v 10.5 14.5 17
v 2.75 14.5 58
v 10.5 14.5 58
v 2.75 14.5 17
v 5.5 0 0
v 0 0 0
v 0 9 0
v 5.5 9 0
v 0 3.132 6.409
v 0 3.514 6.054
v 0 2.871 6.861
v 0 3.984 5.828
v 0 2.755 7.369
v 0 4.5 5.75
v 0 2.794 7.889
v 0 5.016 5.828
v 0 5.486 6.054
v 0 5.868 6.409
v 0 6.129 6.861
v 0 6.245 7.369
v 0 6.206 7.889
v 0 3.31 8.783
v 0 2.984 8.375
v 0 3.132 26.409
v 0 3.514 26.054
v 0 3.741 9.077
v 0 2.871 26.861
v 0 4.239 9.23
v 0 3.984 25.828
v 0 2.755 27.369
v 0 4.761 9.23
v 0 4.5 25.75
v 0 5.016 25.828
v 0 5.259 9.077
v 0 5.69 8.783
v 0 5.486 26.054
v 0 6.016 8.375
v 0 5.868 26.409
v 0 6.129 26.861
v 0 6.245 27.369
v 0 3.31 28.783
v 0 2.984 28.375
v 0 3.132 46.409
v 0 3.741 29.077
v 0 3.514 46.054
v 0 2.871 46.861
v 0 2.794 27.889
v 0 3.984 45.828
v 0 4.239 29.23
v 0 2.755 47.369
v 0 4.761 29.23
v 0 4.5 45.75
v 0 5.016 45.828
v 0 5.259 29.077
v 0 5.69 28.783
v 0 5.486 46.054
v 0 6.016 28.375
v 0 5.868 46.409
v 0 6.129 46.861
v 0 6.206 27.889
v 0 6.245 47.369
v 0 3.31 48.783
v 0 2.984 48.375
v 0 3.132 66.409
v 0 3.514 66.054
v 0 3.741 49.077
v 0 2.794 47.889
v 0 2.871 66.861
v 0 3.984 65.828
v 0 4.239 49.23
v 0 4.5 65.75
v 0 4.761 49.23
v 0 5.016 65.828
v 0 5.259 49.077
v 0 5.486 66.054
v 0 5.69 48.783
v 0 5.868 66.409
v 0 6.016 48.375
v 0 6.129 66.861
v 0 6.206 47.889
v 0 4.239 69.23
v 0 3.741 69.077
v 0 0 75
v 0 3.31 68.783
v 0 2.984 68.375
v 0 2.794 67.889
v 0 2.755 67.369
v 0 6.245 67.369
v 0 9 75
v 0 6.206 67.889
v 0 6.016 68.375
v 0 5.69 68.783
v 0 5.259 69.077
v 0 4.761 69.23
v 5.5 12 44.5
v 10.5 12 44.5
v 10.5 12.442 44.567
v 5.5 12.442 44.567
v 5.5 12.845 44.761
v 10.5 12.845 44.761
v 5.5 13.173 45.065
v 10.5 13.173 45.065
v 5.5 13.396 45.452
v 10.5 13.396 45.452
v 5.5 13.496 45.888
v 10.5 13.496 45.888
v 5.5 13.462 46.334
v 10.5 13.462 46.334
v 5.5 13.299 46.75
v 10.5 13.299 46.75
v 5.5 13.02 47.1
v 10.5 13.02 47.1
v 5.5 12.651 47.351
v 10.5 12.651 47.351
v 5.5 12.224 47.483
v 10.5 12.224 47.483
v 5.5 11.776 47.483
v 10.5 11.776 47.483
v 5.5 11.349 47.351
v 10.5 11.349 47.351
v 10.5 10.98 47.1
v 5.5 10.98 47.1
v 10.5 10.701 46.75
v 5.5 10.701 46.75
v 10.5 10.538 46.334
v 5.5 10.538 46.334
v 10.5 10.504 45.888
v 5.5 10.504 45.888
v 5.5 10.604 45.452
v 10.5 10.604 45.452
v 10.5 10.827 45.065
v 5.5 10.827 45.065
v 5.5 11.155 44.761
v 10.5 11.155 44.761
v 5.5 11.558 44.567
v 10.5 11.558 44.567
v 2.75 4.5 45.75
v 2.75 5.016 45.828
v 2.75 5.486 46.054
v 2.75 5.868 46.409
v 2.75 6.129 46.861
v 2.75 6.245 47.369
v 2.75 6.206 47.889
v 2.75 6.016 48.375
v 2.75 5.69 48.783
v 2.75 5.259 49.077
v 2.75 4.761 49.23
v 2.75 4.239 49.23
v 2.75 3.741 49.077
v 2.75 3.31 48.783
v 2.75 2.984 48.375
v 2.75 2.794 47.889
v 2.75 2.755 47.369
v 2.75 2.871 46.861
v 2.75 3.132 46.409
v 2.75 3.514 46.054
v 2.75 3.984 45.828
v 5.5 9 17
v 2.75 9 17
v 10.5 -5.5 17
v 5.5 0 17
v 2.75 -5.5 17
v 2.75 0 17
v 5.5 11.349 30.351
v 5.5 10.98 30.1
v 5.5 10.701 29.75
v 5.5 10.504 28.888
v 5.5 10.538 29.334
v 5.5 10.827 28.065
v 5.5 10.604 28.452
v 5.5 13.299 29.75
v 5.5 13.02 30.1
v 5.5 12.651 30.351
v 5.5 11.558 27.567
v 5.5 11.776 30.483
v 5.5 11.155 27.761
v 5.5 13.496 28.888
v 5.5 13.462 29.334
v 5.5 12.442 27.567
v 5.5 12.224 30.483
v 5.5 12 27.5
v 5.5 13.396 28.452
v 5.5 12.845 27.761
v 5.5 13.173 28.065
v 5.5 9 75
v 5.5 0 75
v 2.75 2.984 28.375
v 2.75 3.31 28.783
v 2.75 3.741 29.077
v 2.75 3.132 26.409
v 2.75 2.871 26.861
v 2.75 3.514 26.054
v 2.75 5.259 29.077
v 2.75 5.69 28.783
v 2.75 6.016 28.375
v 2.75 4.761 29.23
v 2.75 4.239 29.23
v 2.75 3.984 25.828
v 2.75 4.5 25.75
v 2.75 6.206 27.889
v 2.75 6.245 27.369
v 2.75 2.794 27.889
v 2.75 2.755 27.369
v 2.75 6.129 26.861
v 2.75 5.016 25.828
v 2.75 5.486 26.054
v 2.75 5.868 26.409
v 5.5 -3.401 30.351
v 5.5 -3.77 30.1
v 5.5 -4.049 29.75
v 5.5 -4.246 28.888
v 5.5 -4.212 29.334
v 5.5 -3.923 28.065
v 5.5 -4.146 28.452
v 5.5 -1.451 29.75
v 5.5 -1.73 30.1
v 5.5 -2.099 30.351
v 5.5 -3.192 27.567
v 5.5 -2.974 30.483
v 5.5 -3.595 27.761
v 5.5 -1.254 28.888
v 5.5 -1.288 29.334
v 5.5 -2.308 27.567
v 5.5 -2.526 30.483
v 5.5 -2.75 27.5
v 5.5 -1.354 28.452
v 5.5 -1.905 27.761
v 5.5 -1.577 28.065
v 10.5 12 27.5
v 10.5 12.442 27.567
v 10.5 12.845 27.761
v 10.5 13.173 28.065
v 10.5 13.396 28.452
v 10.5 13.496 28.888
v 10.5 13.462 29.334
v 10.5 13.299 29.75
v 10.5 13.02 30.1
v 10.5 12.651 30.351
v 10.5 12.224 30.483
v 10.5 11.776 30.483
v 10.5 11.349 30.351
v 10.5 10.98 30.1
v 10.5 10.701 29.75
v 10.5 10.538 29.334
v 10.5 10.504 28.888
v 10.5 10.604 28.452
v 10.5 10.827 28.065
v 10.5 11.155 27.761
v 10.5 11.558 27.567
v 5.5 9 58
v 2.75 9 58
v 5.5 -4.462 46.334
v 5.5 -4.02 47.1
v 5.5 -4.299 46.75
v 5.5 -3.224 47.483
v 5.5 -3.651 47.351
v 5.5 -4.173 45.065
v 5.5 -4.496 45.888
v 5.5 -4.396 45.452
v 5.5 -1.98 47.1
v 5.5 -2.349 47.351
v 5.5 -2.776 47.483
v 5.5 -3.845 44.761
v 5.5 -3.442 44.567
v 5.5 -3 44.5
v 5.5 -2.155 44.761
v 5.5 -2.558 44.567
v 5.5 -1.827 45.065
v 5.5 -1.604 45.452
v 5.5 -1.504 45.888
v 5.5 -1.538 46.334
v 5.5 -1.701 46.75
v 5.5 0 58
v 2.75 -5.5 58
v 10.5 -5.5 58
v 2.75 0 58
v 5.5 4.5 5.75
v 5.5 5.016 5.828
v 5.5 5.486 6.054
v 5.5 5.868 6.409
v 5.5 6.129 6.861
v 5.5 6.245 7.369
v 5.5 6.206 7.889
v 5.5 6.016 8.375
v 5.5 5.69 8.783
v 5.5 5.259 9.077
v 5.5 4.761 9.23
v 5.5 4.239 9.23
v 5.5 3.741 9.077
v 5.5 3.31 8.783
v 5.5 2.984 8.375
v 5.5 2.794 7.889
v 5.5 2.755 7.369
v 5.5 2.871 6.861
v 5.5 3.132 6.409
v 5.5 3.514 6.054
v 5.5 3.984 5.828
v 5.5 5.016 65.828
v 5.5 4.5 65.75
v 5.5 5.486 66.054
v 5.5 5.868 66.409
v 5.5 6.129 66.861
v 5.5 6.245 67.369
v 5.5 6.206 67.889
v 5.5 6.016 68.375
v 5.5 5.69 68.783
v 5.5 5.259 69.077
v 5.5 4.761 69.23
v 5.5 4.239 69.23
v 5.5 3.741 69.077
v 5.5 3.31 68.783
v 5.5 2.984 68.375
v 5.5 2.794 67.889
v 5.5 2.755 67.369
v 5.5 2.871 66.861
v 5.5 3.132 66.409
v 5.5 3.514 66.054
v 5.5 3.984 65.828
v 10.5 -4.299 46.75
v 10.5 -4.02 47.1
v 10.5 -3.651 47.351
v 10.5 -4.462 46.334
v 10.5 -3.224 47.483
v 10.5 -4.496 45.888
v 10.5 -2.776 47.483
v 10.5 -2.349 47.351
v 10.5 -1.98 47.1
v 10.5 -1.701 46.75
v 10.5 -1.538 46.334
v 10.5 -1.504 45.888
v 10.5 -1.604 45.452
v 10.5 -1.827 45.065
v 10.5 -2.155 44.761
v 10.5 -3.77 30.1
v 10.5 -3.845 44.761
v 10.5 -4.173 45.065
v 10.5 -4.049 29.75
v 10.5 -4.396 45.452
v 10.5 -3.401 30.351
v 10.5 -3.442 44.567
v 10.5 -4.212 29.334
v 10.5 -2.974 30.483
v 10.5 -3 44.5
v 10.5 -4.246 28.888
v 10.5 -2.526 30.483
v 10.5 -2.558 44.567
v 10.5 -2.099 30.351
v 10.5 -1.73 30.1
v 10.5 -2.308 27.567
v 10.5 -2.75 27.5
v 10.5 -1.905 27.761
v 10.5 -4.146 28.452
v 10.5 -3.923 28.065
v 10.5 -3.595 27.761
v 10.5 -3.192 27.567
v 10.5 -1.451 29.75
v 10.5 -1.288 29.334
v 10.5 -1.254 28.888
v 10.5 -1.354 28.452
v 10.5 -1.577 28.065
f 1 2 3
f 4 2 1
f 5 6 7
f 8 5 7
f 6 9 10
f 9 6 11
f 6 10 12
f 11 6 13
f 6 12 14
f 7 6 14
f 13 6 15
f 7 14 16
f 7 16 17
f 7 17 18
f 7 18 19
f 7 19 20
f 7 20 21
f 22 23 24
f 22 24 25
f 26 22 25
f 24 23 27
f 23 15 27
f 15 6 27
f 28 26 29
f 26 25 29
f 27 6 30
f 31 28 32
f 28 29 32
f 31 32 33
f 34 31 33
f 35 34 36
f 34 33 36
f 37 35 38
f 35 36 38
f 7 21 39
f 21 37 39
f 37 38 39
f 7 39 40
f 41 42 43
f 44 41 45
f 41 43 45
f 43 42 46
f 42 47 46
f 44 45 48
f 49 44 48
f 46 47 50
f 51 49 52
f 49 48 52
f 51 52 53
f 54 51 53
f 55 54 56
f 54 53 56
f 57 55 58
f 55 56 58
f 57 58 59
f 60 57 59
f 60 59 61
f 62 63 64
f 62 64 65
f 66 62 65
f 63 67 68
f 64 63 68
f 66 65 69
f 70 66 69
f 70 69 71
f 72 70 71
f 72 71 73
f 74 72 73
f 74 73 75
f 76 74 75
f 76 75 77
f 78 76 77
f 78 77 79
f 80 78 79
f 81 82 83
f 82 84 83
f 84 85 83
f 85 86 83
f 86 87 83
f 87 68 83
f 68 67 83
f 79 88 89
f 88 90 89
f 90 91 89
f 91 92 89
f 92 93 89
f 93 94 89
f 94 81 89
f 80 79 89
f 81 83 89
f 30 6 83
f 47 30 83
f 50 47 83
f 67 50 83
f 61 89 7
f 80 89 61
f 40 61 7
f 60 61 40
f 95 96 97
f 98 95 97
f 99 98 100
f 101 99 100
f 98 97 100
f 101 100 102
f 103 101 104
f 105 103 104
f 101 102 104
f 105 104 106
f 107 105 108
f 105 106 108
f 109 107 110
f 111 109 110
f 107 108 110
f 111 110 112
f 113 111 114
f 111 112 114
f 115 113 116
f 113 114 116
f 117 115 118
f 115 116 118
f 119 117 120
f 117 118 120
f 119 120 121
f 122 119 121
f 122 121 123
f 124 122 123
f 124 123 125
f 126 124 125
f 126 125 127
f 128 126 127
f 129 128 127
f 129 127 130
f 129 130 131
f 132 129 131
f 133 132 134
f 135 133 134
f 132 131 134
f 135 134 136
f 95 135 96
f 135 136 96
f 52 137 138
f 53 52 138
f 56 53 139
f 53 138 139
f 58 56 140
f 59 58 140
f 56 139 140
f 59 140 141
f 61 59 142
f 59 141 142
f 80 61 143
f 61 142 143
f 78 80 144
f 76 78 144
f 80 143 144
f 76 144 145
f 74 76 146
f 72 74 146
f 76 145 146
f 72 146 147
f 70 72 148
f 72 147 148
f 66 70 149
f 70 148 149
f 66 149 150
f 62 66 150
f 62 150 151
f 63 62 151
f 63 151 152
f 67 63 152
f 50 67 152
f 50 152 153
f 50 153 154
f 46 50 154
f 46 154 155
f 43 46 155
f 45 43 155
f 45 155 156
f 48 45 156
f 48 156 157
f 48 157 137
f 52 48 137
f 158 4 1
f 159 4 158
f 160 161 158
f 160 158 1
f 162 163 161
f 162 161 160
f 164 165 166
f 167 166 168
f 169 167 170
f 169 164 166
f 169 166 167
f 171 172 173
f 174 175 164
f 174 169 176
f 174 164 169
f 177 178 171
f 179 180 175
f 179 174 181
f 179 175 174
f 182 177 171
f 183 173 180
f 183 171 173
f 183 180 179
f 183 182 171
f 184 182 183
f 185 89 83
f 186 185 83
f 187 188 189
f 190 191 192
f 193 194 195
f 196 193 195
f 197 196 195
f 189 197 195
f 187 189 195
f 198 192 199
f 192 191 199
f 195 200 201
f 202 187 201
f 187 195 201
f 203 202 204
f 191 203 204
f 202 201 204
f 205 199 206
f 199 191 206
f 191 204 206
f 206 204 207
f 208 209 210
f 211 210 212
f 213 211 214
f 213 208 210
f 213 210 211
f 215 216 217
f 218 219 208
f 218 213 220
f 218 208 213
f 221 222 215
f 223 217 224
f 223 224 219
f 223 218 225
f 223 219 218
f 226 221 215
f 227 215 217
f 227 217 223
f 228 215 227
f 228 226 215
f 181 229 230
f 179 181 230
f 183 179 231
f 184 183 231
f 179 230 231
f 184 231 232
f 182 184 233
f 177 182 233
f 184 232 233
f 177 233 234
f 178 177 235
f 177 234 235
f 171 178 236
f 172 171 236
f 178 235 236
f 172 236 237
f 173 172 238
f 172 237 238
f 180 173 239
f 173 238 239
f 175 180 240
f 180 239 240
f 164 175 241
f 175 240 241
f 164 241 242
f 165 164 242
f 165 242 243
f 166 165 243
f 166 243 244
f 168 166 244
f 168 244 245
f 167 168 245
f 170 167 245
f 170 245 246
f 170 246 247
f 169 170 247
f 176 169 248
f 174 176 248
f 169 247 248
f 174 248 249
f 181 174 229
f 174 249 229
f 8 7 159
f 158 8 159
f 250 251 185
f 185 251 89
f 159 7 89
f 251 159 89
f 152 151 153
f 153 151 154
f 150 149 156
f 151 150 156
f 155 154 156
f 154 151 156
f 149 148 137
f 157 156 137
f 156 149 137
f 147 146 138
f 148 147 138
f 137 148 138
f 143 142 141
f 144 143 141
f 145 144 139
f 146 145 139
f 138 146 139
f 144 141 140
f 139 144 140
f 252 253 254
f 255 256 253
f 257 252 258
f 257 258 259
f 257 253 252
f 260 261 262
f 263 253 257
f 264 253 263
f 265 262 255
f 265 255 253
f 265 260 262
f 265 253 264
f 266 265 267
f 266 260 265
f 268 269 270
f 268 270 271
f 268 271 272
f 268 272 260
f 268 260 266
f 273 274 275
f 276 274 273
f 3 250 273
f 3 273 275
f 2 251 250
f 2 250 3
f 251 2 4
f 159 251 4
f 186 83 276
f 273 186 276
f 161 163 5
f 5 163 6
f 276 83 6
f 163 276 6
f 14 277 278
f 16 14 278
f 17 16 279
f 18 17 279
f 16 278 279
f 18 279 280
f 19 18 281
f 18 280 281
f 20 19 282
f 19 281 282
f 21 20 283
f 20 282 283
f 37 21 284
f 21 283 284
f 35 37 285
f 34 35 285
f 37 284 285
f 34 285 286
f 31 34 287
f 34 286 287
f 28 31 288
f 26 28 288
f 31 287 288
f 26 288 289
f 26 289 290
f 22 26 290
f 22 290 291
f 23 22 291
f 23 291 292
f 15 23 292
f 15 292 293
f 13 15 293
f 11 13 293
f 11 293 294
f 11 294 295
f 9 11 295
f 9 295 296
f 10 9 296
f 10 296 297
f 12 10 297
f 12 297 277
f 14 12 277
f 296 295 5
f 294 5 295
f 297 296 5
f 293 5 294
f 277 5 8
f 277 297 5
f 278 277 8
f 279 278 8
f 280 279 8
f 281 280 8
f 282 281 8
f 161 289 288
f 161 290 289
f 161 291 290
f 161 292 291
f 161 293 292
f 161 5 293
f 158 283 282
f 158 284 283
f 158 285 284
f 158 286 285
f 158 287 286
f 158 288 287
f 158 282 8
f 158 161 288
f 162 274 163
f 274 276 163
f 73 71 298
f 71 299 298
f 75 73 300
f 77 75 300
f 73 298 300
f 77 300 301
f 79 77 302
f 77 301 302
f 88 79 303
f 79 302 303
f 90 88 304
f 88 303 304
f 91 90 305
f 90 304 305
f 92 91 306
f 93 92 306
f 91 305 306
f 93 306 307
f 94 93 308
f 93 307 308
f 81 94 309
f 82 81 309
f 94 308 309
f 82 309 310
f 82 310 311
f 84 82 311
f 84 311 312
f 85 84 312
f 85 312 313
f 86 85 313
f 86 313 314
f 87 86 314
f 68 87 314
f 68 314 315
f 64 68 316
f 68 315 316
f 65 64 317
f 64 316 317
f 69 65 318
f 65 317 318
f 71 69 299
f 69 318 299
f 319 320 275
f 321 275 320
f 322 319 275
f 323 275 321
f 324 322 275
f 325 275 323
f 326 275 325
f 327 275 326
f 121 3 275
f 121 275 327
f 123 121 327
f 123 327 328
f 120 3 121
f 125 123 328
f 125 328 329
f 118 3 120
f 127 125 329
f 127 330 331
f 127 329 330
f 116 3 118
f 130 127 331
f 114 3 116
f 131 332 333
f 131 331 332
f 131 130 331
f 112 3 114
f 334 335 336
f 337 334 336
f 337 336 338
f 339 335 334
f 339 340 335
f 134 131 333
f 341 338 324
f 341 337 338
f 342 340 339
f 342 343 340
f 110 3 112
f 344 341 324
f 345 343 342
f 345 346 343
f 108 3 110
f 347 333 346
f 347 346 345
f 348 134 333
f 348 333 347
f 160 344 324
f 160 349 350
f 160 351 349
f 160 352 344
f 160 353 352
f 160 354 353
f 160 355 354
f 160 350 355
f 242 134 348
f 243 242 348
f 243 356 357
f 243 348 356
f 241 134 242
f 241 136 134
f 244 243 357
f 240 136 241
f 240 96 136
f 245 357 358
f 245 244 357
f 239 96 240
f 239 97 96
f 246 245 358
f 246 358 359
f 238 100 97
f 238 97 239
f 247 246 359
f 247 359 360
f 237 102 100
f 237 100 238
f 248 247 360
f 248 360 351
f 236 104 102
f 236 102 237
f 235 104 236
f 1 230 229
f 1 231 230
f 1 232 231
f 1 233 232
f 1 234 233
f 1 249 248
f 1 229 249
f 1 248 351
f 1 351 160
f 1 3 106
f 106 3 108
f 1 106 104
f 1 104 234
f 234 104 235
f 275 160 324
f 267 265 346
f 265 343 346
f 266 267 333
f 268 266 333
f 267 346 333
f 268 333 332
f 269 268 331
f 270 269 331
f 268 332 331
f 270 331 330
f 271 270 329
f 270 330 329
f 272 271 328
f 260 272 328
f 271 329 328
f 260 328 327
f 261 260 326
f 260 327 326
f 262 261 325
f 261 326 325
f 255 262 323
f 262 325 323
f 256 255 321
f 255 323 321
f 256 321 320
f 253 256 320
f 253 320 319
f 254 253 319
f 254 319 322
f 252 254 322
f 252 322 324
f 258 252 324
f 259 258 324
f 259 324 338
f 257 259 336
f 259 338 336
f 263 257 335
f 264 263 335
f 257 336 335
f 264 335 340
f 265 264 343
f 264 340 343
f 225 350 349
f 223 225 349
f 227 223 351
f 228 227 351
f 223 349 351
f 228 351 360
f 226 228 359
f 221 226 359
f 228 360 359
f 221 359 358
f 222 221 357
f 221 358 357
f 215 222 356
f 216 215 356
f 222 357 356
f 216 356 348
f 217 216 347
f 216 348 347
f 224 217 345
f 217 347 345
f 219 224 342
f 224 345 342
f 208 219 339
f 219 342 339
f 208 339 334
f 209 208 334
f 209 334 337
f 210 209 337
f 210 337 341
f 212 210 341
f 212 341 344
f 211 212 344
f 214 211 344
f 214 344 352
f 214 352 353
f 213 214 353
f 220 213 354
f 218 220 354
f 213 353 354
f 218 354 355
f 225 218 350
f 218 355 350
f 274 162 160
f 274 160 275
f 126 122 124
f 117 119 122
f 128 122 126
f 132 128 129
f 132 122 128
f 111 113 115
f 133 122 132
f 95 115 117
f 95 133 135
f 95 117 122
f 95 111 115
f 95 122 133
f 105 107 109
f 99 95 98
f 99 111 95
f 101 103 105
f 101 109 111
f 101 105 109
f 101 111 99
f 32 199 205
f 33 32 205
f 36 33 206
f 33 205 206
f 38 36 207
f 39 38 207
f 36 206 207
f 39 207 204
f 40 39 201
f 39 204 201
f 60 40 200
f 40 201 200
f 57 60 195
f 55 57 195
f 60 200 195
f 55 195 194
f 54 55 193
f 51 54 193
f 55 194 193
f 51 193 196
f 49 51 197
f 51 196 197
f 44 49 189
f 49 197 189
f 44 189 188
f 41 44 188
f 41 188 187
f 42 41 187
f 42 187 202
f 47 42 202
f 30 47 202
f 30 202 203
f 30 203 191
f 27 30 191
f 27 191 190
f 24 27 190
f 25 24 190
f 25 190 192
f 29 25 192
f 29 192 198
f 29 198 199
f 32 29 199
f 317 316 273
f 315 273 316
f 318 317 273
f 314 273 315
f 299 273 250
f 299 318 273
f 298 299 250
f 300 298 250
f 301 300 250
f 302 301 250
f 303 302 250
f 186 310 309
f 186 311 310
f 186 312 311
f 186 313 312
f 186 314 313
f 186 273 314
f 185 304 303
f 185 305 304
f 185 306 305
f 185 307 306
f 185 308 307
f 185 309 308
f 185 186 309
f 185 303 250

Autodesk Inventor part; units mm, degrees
ref_plane "YZ Plane" through (0, 0, 0) normal (1, 0, 0) x (0, 1, 0)
ref_plane "XZ Plane" through (0, 0, 0) normal (0, 1, 0) x (-1, 0, 0)
ref_plane "XY Plane" through (0, 0, 0) normal (0, 0, 1) x (1, 0, 0)
sketch "Skizze1" plane through (0, 0, 0) normal (1, 0, 0) x (0, 1, 0)
  line L0 (0, 0) -> (9, 0)
  line L1 (9, 0) -> (9, 75)
  line L2 (9, 75) -> (0, 75)
  line L3 (0, 75) -> (0, 0)
  dimension "d0" = 9
  dimension "d1" = 75
extrude "Extrusion1" add sketch "Skizze1" along normal blind 5.5
sketch "Skizze2" plane through (5.5, 0, 0) normal (1, 0, 0) x (0, 0, -1)
  line L0 (0, 0) -> (0, 9) projected
  line L1 (0, 9) -> (-75, 9) projected
  line L2 (-75, 9) -> (-75, 0) projected
  line L3 (-75, 0) -> (0, 0) projected
  circle A0 centre (-67.5, 4.5) radius 1.75
  circle A1 centre (-7.5, 4.5) radius 1.75
  circle A2 centre (-47.5, 4.5) radius 1.75
  circle A3 centre (-27.5, 4.5) radius 1.75
  dimension "d4" = 3.5
  dimension "d5" = 7.5
  dimension "d6" = 3.5
  dimension "d7" = 7.5
  dimension "d8" = 3.5
  dimension "d9" = 20
  dimension "d10" = 3.5
  dimension "d11" = 20
extrude "Extrusion2" cut sketch "Skizze2" against normal through all contours A0 | A1 | A2 | A3
sketch "Skizze3" plane through (5.5, 0, 0) normal (1, 0, 0) x (0, 0, -1)
  circle A0 centre (-47.5, 4.5) radius 1.75 projected
  circle A1 centre (-67.5, 4.5) radius 1.75 projected
  circle A2 centre (-7.5, 4.5) radius 1.75 projected
  circle A3 centre (-27.5, 4.5) radius 1.75 projected
  line L0 (0, 0) -> (0, 9) projected
  line L1 (0, 9) -> (-75, 9) projected
  line L2 (-75, 9) -> (-75, 0) projected
  line L3 (-75, 0) -> (0, 0) projected
  line L4 (-58, 14.5) -> (-17, 14.5)
  line L5 (-17, 14.5) -> (-17, -5.5)
  line L6 (-17, -5.5) -> (-58, -5.5)
  line L7 (-58, -5.5) -> (-58, 14.5)
  line L8 (-58, 14.5) -> (-17, -5.5) construction
  line L9 (-17, 14.5) -> (-58, -5.5) construction
  point P0 (-37.5, 4.5)
  dimension "d15" = 41
  dimension "d16" = 20
extrude "Extrusion3" add sketch "Skizze3" along normal blind 5 and the other way blind 2.75 contours A0 | A3 | L5 L6 L7 L3 | L3 L7 L1 L5 | L1 L7 L4 L5
sketch "Skizze4" plane through (10.5, 0, 0) normal (1, 0, 0) x (0, 0, -1)
  line L0 (-17, 14.5) -> (-58, 14.5) projected
  line L1 (-58, 14.5) -> (-58, -5.5) projected
  line L2 (-58, -5.5) -> (-17, -5.5) projected
  line L3 (-17, -5.5) -> (-17, 14.5) projected
  circle A0 centre (-46, -3) radius 1.5
  circle A1 centre (-46, 12) radius 1.5
  circle A2 centre (-29, -2.75) radius 1.5
  circle A3 centre (-29, 12) radius 1.5
  circle A4 centre (-29, -2.75) radius 1.5 projected
  circle A5 centre (-29, 12) radius 1.5 projected
  circle A6 centre (-46, 12) radius 1.5 projected
  circle A7 centre (-46, -3) radius 1.5 projected
  line L4 (-23, -4.9525) -> (-23, 23.5) projected
  line L5 (-23, 23.5) -> (-58, 23.5) projected
  line L6 (-58, 23.5) -> (-58, -4.9525) projected
  line L7 (-23, -4.9525) -> (-58, -4.9525) projected
  circle A8 centre (-46, 21.0354) radius 1.5
  circle A9 centre (-30.5, 21.0354) radius 1.5
  circle A10 centre (-46, 20.5472) radius 1.5 projected
  circle A11 centre (-30.5, 20.5472) radius 1.5 projected
  point P0 (0, 0)
  dimension "d21" = 3
  dimension "d22" = 3
  dimension "d23" = 3
  dimension "d24" = 3
  dimension "d27" = 3
  dimension "d28" = 3
extrude "Extrusion4" cut sketch "Skizze4" against normal blind 5 contours A0 | A1 | A2 | A3 | A8 A10 | A10 A8 | A9 A11 | A11 A9 picked at (-46.157, 22.1946) picked at (-45.8838, 21.1962) picked at (-30.657, 22.1946) picked at (-30.3838, 20.3864)
properties part number "90_Linearführung" material "Eisen, grau"
